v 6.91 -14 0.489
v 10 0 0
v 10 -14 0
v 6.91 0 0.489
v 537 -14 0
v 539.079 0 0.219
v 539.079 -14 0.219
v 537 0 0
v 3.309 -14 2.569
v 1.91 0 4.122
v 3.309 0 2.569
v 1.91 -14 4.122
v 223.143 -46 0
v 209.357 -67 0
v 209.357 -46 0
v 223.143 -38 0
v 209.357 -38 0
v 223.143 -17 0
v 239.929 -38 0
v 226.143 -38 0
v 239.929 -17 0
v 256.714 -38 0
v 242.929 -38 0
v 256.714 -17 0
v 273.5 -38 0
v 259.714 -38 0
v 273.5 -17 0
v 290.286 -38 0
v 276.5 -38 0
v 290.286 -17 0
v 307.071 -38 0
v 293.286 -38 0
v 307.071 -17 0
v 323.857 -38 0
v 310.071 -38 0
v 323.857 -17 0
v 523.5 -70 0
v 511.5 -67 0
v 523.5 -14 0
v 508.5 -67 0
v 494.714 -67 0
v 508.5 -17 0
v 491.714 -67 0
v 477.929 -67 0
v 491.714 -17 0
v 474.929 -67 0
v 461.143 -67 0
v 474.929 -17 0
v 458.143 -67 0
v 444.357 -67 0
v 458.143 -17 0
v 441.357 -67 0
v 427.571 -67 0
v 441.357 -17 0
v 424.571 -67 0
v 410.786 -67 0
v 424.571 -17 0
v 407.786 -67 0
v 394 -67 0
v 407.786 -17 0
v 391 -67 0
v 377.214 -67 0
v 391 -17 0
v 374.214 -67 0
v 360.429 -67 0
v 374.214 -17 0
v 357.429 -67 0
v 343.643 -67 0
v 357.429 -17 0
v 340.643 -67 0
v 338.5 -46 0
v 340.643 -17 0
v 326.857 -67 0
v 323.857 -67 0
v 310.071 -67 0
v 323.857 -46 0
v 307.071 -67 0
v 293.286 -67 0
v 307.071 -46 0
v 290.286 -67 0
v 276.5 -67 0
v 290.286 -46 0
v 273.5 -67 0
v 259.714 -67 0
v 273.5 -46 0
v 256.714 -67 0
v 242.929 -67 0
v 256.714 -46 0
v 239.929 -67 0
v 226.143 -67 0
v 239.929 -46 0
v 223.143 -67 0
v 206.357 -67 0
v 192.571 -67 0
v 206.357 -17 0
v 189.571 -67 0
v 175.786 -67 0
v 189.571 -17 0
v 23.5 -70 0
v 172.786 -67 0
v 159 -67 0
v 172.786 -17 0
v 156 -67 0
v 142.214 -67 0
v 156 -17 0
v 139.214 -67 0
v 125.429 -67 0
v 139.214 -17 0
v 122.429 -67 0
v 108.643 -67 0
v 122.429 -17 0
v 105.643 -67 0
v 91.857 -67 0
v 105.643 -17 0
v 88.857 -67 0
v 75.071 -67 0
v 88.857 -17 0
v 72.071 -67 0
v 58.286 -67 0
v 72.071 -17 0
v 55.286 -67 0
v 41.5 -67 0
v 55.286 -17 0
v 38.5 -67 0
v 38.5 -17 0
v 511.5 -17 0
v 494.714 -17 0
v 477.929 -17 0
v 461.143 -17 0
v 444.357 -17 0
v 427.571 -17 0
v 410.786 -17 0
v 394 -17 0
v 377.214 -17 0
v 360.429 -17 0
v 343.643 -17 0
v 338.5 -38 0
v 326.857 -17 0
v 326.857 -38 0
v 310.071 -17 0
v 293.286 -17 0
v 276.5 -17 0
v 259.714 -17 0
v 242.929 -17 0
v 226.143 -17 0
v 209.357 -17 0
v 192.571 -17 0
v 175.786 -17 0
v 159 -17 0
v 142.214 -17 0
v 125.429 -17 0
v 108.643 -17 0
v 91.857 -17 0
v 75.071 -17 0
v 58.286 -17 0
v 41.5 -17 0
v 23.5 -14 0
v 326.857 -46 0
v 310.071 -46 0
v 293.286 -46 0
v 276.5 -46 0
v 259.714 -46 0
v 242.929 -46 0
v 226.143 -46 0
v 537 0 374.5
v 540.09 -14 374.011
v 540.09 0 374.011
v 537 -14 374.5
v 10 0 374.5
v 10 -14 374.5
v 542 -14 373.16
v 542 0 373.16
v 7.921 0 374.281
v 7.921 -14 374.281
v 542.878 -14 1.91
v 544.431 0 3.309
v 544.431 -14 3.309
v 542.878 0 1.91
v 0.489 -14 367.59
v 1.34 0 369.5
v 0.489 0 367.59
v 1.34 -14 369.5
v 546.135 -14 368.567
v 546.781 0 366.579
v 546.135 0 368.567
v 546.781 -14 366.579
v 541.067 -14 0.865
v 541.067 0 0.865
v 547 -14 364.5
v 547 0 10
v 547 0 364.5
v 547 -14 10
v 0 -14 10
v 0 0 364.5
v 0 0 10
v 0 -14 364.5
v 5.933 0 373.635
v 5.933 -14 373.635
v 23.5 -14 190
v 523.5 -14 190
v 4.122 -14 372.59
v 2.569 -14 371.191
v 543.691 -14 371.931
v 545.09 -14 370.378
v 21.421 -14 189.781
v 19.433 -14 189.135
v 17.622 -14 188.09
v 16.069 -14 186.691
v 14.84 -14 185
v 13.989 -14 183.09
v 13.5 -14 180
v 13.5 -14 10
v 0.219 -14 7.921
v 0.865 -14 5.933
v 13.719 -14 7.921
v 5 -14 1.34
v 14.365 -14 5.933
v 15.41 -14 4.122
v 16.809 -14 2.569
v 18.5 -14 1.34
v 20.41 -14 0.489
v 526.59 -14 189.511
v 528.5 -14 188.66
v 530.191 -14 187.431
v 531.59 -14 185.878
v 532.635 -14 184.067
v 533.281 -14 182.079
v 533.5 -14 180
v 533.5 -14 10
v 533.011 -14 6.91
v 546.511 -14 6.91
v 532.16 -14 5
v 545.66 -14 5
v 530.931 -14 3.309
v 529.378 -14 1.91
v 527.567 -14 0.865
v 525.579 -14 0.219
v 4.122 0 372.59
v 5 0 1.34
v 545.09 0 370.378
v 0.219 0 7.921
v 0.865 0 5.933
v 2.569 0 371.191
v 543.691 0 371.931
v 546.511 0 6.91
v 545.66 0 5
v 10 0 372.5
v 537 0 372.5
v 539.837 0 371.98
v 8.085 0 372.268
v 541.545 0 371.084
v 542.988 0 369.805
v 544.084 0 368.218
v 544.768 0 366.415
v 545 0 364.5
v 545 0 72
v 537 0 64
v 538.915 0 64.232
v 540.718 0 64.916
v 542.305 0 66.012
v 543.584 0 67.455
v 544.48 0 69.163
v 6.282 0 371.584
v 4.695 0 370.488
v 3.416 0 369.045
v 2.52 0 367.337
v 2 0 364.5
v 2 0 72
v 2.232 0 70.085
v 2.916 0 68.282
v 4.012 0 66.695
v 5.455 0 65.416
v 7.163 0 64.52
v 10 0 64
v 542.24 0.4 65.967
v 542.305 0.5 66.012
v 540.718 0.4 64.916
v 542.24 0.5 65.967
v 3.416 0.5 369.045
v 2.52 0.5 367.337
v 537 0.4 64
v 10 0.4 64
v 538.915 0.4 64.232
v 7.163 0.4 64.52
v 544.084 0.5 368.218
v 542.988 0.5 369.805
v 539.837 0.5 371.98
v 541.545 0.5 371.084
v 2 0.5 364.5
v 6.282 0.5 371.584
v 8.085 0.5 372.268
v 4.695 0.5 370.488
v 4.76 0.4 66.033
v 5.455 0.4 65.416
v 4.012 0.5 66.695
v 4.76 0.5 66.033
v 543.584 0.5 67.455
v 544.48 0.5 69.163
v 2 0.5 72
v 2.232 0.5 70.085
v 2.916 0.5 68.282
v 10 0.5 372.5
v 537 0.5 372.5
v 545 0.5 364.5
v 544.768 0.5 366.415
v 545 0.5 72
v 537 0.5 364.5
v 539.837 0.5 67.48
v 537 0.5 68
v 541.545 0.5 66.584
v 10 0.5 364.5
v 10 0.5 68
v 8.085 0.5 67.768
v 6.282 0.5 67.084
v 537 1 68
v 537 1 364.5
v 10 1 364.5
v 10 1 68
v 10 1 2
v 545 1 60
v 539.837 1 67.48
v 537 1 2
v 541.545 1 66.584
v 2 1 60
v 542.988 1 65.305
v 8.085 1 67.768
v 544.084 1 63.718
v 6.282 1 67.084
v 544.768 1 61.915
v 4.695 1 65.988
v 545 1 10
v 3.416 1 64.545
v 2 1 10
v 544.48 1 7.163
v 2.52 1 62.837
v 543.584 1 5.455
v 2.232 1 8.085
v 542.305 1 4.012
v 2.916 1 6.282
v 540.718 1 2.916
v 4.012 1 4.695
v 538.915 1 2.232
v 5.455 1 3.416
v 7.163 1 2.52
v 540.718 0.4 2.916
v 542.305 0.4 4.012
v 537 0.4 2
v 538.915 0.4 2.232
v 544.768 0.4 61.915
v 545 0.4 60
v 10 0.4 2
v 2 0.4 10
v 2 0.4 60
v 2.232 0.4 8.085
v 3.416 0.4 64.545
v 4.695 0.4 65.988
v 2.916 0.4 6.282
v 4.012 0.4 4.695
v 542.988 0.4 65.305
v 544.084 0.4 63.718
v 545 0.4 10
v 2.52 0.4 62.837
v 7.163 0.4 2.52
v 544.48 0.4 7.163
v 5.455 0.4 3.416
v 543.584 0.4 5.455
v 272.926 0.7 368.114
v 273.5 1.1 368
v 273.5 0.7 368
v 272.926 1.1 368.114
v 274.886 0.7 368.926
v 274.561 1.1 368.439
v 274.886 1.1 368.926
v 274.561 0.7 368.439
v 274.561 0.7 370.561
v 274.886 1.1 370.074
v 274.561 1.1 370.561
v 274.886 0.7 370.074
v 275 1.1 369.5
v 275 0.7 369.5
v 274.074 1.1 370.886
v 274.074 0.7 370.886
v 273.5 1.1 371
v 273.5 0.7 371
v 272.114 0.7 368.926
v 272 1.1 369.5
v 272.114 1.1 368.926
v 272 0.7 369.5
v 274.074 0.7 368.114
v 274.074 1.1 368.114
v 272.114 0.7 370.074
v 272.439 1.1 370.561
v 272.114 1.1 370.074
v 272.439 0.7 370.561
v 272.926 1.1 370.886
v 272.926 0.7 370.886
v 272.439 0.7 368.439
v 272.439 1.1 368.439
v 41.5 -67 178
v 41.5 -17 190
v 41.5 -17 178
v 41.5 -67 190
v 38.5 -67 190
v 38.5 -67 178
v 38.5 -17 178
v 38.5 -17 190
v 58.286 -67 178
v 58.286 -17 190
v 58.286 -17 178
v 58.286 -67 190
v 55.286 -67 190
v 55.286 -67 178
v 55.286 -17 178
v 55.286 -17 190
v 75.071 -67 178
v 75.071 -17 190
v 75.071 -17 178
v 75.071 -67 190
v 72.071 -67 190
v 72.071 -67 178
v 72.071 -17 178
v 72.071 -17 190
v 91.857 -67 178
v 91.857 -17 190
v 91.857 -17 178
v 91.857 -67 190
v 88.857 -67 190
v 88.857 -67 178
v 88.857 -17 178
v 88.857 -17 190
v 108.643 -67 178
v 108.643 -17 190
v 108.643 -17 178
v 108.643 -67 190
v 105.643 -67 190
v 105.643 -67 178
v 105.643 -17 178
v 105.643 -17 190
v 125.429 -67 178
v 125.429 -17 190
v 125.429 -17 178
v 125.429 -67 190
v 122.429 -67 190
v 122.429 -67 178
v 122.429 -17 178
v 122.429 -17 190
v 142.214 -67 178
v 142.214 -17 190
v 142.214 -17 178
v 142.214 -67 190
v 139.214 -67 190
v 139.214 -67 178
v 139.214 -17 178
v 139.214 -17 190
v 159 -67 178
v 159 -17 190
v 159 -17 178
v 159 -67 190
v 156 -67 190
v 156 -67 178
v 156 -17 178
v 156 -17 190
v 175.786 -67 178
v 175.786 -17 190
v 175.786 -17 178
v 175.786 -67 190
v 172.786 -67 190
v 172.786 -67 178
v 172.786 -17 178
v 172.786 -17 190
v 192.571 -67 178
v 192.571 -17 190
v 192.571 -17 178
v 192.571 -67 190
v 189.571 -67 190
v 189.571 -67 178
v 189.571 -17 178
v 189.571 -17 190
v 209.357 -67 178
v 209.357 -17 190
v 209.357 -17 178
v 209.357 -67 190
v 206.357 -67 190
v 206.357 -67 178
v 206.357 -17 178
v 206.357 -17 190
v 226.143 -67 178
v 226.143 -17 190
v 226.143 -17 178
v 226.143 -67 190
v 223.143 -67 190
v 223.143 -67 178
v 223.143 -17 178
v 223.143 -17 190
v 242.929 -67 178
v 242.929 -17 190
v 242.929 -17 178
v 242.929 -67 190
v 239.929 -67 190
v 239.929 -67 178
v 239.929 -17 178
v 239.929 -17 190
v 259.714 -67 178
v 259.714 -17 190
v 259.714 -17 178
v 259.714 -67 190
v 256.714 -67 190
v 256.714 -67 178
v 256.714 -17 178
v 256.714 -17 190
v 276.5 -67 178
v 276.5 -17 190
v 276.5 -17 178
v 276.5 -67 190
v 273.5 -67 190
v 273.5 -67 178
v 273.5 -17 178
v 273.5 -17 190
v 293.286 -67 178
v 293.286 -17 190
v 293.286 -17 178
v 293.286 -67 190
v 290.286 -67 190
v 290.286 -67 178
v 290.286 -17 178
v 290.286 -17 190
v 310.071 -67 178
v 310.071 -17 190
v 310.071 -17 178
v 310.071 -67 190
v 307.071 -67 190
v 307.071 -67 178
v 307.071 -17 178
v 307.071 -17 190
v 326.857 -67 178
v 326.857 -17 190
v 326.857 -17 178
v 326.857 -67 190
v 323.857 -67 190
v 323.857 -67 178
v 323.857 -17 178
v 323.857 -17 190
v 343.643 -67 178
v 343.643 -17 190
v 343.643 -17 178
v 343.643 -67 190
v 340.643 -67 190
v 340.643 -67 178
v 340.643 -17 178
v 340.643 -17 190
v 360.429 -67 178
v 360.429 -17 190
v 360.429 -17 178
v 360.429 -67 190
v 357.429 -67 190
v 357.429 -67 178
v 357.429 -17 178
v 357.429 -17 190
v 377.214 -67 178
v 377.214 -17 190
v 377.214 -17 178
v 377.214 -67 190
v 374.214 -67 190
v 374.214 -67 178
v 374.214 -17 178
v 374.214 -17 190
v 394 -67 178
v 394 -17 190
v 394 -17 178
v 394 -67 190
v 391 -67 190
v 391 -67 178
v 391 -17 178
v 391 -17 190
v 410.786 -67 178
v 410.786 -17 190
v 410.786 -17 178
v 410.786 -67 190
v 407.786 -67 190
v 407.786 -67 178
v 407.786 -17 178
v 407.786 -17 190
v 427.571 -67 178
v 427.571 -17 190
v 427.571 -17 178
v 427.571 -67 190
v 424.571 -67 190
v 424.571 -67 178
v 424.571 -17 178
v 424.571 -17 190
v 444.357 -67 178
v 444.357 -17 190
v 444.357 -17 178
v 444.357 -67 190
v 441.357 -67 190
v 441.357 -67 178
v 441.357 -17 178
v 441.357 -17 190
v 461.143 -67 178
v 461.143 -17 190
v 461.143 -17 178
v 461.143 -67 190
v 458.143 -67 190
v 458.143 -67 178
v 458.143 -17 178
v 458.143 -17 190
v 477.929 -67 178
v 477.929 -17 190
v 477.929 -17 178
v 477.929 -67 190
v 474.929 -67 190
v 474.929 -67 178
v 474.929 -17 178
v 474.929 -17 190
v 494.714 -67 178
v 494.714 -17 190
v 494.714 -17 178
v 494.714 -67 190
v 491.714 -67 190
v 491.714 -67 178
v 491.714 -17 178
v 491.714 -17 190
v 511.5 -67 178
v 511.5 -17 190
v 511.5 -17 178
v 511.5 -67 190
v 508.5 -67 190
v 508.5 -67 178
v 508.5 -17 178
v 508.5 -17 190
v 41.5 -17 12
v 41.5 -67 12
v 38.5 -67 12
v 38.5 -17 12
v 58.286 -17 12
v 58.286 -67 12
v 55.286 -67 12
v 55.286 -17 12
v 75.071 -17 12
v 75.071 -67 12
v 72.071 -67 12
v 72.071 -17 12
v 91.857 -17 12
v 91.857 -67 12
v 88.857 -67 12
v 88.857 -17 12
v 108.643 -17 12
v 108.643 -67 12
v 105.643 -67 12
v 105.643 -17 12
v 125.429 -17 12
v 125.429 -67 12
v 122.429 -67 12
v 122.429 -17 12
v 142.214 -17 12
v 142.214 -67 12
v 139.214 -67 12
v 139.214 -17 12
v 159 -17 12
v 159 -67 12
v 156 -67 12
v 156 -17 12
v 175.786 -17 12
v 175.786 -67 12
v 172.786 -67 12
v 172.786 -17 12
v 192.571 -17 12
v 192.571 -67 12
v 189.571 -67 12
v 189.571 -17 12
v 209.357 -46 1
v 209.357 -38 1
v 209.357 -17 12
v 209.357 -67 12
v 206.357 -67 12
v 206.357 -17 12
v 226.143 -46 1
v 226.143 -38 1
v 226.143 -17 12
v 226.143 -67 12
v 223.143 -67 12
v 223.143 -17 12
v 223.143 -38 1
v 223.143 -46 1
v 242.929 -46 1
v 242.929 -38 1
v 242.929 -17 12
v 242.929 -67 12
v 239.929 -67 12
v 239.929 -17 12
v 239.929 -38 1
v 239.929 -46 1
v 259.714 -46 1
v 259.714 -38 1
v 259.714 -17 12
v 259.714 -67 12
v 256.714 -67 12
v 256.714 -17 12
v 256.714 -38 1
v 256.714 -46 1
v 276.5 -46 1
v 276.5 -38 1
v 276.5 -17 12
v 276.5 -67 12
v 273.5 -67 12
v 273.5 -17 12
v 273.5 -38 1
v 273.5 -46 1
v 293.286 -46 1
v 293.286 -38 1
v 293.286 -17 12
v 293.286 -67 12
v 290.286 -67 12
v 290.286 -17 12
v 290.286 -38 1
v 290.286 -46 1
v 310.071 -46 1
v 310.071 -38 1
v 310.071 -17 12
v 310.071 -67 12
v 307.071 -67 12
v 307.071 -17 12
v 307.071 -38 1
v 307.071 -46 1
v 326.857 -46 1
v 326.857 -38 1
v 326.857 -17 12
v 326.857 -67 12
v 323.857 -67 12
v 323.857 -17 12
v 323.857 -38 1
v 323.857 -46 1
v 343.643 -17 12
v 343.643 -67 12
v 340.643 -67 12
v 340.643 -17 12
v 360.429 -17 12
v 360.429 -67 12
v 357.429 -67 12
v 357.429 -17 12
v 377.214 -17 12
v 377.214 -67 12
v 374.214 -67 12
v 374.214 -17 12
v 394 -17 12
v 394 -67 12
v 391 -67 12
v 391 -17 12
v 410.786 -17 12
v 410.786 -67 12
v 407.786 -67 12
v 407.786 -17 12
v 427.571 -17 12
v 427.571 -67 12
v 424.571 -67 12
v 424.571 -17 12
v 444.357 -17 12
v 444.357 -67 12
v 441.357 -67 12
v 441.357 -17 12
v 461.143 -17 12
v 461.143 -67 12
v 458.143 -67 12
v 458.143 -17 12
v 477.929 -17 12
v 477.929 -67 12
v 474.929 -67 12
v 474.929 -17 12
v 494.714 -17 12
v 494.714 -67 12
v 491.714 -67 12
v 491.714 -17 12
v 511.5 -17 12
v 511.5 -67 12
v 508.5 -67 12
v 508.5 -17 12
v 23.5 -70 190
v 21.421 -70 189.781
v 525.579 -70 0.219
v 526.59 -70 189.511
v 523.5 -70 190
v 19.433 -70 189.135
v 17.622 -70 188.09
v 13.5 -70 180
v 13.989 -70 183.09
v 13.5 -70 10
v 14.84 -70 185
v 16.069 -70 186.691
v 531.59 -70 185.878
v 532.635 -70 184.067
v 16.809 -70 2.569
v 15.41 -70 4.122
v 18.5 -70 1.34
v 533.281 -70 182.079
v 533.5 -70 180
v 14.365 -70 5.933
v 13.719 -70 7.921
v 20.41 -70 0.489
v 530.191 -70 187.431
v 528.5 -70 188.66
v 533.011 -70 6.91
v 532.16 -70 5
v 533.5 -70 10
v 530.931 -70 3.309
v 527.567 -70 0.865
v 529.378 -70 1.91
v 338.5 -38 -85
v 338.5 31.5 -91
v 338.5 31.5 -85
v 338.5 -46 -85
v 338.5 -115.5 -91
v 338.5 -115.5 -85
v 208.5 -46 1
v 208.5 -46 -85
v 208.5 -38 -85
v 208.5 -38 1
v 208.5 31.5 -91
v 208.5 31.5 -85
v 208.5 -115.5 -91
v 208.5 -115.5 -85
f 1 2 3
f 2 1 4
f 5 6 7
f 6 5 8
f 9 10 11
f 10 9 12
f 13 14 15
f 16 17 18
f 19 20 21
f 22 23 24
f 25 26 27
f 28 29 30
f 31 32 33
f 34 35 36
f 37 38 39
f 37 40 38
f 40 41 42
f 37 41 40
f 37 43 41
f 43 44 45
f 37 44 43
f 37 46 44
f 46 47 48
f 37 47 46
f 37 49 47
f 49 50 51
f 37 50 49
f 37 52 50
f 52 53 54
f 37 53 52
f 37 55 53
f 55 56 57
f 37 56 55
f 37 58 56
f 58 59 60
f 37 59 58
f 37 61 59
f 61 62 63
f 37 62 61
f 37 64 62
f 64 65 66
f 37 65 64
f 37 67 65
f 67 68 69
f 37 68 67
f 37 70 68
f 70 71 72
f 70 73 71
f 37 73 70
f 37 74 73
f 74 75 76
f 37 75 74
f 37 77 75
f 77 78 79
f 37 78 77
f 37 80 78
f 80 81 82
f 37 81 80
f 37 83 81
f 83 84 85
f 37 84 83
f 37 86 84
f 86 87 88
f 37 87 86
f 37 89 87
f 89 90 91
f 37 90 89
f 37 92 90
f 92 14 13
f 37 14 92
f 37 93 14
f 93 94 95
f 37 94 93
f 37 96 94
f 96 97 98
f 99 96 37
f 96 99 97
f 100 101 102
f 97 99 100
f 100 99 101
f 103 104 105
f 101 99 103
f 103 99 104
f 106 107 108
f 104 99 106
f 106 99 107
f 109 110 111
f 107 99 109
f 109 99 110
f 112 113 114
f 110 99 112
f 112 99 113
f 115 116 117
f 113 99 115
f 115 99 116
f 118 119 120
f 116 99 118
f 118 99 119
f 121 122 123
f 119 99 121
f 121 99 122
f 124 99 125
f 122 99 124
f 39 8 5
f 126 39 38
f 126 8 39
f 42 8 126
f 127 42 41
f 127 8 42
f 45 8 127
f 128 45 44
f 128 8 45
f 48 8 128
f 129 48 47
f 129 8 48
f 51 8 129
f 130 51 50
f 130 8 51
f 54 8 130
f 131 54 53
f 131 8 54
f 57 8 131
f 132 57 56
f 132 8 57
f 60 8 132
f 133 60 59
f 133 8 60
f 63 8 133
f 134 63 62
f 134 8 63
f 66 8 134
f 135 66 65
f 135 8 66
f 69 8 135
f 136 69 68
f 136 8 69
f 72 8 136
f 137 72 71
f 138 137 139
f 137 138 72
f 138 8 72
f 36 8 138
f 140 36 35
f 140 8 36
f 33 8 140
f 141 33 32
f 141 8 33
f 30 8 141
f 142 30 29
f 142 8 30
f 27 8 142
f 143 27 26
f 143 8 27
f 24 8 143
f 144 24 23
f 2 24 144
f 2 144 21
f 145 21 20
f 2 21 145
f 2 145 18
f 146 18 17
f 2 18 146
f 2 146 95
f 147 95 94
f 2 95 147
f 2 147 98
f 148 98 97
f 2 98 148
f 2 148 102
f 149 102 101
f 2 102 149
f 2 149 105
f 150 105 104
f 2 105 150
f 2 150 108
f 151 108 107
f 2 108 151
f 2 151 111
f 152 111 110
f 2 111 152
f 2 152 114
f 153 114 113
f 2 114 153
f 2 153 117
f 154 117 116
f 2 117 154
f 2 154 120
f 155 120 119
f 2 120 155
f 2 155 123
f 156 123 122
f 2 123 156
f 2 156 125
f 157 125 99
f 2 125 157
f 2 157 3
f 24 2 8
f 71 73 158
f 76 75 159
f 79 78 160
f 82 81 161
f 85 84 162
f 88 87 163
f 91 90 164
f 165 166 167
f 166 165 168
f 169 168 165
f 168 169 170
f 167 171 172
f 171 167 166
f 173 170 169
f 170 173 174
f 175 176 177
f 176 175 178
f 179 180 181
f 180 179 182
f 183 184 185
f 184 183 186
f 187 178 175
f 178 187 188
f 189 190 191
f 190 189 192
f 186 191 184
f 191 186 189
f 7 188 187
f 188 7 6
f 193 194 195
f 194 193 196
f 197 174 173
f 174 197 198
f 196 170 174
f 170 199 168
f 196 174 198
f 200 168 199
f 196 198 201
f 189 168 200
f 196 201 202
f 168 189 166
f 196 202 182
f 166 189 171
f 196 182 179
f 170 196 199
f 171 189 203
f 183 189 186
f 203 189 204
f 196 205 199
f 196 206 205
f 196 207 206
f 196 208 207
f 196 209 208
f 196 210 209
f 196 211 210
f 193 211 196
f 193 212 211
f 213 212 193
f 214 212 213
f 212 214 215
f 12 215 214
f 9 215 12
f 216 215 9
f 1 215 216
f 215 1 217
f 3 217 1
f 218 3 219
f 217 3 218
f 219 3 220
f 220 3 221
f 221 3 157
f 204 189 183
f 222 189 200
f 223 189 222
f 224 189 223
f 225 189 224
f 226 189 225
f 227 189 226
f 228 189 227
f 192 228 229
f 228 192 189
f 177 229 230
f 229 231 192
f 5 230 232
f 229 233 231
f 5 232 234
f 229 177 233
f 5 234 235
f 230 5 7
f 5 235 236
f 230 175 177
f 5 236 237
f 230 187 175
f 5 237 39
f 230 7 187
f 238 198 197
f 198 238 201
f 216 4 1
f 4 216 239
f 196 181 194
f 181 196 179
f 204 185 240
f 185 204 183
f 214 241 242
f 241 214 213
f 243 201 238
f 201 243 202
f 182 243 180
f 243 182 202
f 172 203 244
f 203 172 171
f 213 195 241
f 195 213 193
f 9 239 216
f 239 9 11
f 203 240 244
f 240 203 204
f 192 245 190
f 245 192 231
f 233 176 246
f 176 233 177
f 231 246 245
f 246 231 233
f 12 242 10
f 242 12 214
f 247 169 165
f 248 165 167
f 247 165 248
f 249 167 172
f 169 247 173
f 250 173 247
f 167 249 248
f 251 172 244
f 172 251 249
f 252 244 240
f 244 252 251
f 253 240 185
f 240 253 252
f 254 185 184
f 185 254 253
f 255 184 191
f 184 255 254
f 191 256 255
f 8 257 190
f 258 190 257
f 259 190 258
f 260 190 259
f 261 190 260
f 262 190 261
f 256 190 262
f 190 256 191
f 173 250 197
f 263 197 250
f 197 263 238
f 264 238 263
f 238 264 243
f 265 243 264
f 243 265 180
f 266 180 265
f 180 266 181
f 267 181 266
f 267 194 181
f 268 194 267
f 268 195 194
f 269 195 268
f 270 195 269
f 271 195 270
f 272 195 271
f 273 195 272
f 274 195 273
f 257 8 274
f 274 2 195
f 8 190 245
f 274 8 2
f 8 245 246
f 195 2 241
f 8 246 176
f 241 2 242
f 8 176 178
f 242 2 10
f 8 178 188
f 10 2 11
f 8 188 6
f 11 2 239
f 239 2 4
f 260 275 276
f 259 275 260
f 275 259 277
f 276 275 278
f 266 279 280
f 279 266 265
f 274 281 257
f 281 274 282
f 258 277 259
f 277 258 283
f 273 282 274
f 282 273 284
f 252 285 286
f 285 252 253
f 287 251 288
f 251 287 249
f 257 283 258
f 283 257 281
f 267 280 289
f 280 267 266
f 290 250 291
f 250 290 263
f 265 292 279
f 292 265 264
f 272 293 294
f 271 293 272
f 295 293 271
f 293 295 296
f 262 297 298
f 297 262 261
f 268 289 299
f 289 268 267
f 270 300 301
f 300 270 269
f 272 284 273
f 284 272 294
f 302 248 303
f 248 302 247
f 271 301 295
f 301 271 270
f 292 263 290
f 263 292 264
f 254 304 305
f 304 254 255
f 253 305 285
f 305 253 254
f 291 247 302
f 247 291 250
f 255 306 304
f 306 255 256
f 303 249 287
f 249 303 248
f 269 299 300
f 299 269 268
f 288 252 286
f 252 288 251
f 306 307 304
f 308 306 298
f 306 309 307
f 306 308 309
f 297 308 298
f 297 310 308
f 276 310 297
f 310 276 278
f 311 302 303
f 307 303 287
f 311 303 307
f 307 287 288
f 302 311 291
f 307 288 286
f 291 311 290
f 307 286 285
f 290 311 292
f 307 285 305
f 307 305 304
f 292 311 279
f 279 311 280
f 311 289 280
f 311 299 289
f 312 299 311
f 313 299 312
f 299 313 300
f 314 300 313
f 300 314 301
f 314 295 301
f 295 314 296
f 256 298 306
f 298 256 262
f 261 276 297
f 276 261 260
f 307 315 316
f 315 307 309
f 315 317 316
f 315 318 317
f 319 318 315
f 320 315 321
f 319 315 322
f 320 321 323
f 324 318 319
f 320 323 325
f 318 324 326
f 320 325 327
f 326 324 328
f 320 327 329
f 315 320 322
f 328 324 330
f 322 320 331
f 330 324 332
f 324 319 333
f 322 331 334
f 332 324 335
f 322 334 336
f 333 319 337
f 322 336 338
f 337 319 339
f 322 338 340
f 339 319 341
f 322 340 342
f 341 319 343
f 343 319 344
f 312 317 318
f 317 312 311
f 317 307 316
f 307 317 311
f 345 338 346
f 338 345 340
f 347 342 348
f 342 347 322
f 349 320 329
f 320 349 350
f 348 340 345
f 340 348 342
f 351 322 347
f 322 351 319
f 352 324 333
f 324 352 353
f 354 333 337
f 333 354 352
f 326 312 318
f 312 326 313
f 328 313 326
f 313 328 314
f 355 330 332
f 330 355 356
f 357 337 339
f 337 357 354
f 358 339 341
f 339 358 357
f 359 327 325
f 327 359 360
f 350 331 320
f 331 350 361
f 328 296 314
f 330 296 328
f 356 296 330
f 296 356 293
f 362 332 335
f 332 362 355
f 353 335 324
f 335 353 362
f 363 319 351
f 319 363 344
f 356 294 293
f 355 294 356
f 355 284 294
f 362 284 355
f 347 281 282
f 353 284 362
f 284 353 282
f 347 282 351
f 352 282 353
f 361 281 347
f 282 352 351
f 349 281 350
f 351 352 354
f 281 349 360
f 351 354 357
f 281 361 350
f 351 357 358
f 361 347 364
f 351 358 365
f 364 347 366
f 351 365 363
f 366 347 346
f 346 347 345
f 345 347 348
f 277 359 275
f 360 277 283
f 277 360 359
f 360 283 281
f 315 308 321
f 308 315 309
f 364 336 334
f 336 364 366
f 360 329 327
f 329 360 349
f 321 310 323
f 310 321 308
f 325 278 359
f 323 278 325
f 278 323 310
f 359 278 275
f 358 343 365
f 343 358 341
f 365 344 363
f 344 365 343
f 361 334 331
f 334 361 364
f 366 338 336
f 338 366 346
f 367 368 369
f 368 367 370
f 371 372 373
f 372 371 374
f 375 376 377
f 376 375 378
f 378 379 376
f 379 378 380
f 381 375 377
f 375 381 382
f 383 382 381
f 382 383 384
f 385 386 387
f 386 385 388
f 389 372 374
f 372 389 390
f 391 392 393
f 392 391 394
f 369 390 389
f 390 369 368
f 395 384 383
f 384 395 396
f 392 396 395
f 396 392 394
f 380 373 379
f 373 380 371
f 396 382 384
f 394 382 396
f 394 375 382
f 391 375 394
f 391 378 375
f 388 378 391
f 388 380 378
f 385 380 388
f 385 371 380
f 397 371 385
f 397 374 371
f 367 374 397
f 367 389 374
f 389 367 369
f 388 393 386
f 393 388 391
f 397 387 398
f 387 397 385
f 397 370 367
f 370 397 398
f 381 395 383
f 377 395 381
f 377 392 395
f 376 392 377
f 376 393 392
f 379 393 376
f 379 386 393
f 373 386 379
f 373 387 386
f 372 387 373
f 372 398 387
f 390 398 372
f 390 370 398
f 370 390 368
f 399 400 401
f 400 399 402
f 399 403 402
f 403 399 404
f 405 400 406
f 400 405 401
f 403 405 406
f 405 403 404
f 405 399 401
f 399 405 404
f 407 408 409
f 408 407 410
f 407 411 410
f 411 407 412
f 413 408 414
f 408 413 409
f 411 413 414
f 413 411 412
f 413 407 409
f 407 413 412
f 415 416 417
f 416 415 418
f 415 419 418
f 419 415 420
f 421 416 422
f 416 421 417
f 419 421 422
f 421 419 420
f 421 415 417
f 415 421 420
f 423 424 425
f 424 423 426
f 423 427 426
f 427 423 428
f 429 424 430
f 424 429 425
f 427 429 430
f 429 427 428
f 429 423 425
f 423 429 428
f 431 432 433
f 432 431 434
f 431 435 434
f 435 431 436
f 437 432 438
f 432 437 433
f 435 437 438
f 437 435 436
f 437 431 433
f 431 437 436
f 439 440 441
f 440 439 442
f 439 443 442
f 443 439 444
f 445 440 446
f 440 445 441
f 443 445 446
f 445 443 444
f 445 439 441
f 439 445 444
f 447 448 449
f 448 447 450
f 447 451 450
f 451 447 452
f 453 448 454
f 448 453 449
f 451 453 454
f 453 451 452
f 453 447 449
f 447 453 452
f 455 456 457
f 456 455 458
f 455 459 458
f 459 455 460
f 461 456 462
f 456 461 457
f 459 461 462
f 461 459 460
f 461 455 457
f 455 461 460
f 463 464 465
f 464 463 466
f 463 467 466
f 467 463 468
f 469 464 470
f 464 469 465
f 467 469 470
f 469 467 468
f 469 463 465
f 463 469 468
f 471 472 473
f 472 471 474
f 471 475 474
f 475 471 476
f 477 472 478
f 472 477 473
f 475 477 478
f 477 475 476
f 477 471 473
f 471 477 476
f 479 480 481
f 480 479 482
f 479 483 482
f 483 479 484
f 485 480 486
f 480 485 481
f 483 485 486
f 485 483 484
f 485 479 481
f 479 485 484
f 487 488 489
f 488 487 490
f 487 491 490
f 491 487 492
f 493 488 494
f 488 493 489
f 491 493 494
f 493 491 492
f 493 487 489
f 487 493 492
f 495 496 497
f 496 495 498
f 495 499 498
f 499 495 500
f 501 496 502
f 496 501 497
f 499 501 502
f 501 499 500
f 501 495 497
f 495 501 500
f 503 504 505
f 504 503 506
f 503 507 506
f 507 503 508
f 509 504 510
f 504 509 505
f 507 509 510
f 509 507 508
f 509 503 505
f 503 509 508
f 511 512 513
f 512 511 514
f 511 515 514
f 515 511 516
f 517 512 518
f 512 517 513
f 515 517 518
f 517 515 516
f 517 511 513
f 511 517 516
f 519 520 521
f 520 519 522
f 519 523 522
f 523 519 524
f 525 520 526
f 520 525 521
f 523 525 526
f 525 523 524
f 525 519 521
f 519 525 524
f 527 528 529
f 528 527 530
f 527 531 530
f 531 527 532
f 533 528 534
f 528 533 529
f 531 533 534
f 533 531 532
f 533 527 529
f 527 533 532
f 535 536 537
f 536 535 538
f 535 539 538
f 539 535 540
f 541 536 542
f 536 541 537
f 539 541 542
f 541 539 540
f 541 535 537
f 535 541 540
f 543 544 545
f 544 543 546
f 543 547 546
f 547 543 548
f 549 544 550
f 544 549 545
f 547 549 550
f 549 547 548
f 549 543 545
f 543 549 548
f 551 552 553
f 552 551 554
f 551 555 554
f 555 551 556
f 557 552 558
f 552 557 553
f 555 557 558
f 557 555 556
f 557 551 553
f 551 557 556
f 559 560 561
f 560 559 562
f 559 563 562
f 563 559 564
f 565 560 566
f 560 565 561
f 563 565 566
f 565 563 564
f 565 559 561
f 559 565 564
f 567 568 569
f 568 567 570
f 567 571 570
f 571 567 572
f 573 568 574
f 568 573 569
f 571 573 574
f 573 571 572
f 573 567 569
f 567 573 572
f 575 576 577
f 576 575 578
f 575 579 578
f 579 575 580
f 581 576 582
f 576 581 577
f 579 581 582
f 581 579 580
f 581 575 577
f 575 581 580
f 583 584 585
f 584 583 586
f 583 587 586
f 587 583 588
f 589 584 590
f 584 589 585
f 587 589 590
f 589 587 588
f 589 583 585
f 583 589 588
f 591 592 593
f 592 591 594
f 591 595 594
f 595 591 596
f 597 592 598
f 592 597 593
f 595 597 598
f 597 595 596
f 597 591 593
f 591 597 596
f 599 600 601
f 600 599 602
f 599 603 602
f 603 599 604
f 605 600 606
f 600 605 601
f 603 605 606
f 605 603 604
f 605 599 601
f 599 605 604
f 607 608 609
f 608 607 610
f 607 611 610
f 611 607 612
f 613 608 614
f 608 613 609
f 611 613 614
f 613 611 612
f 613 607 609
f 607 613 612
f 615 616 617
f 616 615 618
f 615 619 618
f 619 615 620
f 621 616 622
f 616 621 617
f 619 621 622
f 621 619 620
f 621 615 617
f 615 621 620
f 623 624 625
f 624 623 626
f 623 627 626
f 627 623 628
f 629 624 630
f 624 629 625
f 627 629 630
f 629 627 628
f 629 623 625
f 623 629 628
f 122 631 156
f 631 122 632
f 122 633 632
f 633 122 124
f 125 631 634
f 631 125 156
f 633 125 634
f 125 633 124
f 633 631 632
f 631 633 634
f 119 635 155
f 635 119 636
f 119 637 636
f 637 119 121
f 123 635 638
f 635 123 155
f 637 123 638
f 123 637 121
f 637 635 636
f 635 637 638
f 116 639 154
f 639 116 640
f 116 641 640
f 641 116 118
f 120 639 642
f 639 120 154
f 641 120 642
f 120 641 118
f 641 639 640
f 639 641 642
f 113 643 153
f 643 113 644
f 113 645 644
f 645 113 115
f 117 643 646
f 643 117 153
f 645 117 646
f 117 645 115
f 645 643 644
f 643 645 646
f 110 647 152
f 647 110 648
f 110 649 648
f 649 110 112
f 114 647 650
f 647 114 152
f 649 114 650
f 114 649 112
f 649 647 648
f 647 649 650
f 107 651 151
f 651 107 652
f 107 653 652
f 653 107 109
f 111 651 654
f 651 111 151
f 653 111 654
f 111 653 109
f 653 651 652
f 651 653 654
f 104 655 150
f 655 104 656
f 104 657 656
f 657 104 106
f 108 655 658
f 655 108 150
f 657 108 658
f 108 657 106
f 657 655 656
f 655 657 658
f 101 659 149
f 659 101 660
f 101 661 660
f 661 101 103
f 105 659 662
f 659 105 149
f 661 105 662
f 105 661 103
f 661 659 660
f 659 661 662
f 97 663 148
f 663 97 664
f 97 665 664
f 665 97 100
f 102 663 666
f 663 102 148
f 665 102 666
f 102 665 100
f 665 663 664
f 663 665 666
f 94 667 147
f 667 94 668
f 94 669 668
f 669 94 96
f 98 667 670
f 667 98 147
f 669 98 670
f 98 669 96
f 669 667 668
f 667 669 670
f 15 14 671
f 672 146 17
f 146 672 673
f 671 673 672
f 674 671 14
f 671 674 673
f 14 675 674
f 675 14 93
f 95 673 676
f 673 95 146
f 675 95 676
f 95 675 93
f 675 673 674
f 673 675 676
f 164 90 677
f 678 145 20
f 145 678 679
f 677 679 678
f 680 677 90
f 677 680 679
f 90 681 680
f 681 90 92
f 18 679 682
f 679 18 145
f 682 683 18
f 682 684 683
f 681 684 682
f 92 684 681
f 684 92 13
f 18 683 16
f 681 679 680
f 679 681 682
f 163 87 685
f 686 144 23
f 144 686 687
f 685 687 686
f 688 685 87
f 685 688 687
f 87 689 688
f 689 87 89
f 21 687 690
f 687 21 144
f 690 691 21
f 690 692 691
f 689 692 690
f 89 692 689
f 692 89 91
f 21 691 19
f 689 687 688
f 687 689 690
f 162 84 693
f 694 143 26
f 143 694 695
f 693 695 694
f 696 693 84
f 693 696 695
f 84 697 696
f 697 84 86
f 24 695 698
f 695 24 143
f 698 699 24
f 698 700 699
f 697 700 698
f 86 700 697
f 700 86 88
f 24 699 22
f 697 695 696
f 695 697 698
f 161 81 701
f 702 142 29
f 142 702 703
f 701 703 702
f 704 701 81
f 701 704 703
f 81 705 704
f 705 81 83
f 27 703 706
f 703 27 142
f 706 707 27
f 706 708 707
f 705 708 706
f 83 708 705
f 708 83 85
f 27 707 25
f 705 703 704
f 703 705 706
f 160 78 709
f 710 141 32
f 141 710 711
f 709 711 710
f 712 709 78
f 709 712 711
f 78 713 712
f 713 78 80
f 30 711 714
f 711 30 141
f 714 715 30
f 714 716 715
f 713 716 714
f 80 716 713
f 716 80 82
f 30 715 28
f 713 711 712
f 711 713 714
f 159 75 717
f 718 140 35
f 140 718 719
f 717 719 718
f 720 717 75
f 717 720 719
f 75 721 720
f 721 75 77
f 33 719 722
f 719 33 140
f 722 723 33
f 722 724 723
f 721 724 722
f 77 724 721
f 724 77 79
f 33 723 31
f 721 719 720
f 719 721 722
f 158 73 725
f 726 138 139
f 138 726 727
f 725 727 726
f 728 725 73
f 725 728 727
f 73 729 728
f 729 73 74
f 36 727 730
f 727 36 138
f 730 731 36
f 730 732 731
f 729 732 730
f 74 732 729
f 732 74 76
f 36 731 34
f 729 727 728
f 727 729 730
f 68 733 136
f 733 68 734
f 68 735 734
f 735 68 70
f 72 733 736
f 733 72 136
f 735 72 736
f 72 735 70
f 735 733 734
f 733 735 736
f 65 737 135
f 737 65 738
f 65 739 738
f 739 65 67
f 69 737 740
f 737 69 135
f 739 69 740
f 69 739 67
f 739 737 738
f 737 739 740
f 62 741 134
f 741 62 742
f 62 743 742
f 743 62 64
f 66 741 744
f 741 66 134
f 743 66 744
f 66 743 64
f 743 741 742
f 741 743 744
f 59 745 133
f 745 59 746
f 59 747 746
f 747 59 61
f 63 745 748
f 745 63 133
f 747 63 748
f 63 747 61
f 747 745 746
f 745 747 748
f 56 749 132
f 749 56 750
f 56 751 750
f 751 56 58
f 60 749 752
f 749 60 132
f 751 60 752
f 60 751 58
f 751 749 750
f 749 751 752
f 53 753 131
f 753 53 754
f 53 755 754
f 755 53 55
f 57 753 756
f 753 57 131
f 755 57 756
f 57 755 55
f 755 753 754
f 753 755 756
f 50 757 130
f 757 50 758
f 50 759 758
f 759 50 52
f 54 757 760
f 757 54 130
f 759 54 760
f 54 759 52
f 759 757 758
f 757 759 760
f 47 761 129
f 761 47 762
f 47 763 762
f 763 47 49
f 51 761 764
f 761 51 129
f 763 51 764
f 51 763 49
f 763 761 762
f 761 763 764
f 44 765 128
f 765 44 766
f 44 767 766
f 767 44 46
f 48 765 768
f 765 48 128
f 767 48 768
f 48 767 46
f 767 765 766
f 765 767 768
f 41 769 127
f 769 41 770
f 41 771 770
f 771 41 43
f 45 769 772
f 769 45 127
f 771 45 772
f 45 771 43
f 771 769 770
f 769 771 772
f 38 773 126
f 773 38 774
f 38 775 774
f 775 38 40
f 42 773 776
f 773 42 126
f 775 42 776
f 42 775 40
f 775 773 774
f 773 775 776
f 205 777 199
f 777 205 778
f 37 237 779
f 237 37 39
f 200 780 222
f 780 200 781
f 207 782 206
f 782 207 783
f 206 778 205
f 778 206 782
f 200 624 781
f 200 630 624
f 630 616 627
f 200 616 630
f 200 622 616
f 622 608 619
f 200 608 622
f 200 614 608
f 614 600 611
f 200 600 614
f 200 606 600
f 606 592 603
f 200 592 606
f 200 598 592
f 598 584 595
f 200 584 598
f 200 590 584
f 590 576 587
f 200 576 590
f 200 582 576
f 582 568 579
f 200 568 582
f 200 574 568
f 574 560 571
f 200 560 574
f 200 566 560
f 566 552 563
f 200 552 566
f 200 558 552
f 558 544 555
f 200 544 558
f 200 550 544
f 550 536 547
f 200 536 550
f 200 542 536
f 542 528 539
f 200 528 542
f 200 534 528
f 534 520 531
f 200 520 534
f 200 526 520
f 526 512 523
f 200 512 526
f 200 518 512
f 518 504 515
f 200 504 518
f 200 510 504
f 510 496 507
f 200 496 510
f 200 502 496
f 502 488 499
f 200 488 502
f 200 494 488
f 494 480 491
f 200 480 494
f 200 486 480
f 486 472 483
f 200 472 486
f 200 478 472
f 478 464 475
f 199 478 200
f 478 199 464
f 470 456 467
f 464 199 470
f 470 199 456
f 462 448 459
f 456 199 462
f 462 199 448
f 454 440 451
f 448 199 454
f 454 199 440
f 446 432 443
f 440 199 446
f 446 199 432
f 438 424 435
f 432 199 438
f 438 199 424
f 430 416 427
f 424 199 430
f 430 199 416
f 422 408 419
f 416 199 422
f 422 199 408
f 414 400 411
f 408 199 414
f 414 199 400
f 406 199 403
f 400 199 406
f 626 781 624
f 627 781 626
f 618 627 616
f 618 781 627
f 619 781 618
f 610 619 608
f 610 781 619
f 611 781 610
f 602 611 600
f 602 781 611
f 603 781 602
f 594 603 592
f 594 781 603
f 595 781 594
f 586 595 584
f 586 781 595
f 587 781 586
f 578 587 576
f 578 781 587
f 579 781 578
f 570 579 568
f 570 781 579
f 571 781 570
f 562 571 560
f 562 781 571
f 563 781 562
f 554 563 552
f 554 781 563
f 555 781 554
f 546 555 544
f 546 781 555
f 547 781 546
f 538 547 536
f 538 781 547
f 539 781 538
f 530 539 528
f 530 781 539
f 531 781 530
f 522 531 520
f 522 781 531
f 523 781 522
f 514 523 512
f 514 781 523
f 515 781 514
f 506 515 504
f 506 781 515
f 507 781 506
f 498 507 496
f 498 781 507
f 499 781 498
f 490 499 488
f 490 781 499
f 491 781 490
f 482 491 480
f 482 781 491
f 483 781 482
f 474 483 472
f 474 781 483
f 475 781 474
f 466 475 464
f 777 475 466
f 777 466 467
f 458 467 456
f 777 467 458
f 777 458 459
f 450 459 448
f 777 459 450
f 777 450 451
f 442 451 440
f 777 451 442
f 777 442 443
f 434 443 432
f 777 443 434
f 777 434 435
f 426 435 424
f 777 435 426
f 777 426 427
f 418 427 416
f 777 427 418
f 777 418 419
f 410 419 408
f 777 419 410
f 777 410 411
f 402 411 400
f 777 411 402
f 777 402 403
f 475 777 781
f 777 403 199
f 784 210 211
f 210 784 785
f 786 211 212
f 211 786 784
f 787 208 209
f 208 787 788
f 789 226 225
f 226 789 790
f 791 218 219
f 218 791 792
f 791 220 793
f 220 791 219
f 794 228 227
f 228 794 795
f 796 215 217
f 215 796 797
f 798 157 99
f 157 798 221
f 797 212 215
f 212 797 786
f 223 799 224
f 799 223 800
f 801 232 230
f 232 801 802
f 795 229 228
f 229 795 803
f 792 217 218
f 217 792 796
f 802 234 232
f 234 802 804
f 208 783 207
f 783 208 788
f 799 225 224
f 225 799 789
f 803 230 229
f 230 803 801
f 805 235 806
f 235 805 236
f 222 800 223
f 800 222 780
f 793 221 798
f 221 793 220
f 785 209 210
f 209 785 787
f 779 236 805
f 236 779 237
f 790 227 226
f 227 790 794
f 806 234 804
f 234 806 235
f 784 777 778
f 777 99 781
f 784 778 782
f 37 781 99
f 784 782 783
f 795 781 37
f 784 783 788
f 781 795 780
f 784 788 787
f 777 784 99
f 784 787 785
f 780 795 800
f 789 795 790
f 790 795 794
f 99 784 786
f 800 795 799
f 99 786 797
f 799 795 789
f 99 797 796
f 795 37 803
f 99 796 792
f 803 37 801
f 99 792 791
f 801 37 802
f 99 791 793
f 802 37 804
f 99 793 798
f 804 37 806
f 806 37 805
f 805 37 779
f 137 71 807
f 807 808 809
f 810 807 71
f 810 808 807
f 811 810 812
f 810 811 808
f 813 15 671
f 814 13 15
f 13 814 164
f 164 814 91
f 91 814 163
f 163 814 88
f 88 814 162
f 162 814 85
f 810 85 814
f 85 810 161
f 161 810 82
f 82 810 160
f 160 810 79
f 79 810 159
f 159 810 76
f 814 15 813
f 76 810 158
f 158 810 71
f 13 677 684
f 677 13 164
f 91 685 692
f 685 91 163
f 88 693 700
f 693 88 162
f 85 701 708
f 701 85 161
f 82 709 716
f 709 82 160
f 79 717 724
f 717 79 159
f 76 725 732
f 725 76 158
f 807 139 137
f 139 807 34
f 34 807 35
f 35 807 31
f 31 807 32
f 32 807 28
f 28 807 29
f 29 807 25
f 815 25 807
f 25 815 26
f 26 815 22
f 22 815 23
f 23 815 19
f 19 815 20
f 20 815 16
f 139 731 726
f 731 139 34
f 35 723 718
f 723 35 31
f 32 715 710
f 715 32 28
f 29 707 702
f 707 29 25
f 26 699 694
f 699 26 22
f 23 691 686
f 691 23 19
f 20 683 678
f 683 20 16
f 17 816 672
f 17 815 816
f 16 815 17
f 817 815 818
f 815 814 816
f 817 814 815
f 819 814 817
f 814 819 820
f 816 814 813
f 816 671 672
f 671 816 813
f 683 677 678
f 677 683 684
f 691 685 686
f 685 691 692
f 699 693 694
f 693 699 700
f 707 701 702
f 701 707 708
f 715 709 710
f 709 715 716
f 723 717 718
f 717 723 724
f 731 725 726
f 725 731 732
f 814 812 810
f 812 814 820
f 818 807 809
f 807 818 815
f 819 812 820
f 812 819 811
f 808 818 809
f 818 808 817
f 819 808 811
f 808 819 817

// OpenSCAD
// iMac(24インチ, M6, 2026) 風 一体型ゲーミングPC (v3)   単位: mm
// 寸法の根拠: Apple公式スペック(幅54.7cm/高さ46.1cm/スタンド奥行14.7cm/幅13cm)と公式画像の比率
// 座標: x=幅, y=高さ(本体下端=0), z=奥行(前面ガラス=0, 背面方向+)
// cutaway=true で背面カバーを外し内部配置を表示
cutaway = false;
flip = false;   // true: モデルを180°回して前面を明るく描画(プレビューの光源が固定のため)
color_scheme = "silver";   // silver / blue / purple / pink / orange / yellow / green (公式7色)

// --- 外形 (iMac 24") ---
W = 547;                    // 本体幅 (公式 54.7cm)
panel_w = 527; panel_h = 296.5;   // 23.8" 16:9 パネル有効領域 (iMacの表示領域は約520x292)
bezel = 10;  chin = 68;
H = panel_h + bezel + chin;       // ≈374.5
slab_t = 14;                // 前面スラブ厚 (iMacは11.5mm, 市販パネル+背面板で14mm)
corner = 10;
// --- 背面ポッド(市販部品を収める) ---
pod_w = 520; pod_h = 190; pod_t = 70;     // 総厚70mm
pod_x0 = (W-pod_w)/2;
// --- スタンド(iMac風一枚板アルミ) ---
stand_w = 130; stand_drop = 85;           // 公式: 本体下端から約85mm下がる(高さ46.1cm)
foot_d = 147;
cx = pod_x0;

// 色はApple公式画像(iMac 24" M6 ページ)から実測した値: [名前, 背面, スタンド, チン]
palette = [
 ["silver", "#D2D3D5", "#BBBCBE", "#D7D8DA"],
 ["blue",   "#5882B2", "#9EB2CD", "#BACEE9"],
 ["purple", "#8581B4", "#ACA3C0", "#C9C5E6"],
 ["pink",   "#E16280", "#E7A9B6", "#FFCFDB"],
 ["orange", "#E5734E", "#F0B498", "#FFCCAF"],
 ["yellow", "#EFD344", "#DCCB97", "#FDEEB7"],
 ["green",  "#41965F", "#A2BFAD", "#B9D8C6"] ];
pal = palette[search([color_scheme],palette)[0]];
body_c = pal[1]; stand_c = pal[2]; chin_c = pal[3];

module rrect(w,h,t,r){ linear_extrude(t) offset(r) offset(-r) square([w,h]); }
module box(p,s,c){ color(c) translate(p) cube(s); }

module slab(){
  color(body_c) rrect(W,H,slab_t,corner);
  color("#EDEEF0") translate([2,H-bezel-panel_h-4,-0.5]) rrect(W-4,panel_h+bezel+4-2,0.6,corner-2); // 前面ガラス(白縁)
  color("#0a0a0c") translate([(W-panel_w)/2,chin,-1]) cube([panel_w,panel_h,0.6]);                     // 表示領域
  color(chin_c)  translate([2,2,-1]) rrect(W-4,chin-2,0.6,corner-2);                                   // チン(淡色)
  color("#333") translate([W/2,H-5,-1.1]) cylinder(d=3,h=0.4,$fn=16);                                  // カメラ
}

module pod_cover(){
  difference(){
    color(body_c) translate([pod_x0,0,slab_t]) rrect(pod_w,pod_h,pod_t-slab_t,10);
    for(i=[0:28]) translate([pod_x0+25+i*(pod_w-50)/28, pod_h-12, slab_t+3]) cube([3,14,pod_t-slab_t-6]);  // 排気
    for(i=[0:28]) translate([pod_x0+25+i*(pod_w-50)/28, -2, slab_t+3]) cube([3,14,pod_t-slab_t-6]);        // 吸気
    if(cutaway) translate([pod_x0+3,3,slab_t+2.5]) cube([pod_w-6,pod_h-6,pod_t]);
  }
  // 背面I/O: iMac風の細スロットを左下に4つ
  if(!cutaway) for(i=[0:3]) color("#222") translate([pod_x0+30+i*14,18,pod_t-0.3]) rrect(4,12,0.4,2);
}

z0 = slab_t + 3;
module internals(){
  x = pod_x0;
  box([x+8,8,z0],[170,170,1.6],"#2a6a3a");                           // Mini-ITX 170x170
  box([x+60,60,z0+1.6],[66,66,35],"#b0b3b8");                         // 低背CPUクーラー
  color("#222") translate([x+93,93,z0+36.6]) cylinder(d=92,h=2,$fn=48);
  box([x+16,18,z0+1.6],[22,10,4],"#333");                             // M.2 SSD
  box([x+178,30,z0],[8,100,12],"#554");                               // PCIe ライザー
  box([x+188,20,z0],[200,125,40],"#202226");                          // GPU (ITX 2スロット)
  color("#888") translate([x+288,82,z0+40.1]) cylinder(d=70,h=0.5,$fn=40);
  box([x+188,148,z0],[150,34,22],"#334");                             // DC-ATX 電源基板
  box([x+396,35,z0],[120,120,25],"#111");                             // 排気ファン 120mm
  color("#555") translate([x+456,95,z0+25.1]) cylinder(d=100,h=0.5,$fn=48);
}

module stand(){
  color(stand_c) translate([W/2-stand_w/2,-stand_drop,(slab_t+pod_t)/2-4]) cube([stand_w,stand_drop+1,8]);        // アーム
  color(stand_c) translate([W/2-stand_w/2,-stand_drop-6,(slab_t+pod_t)/2-foot_d/2]) cube([stand_w,6,foot_d]);     // 足
}

translate([flip?W:0,0,0]) rotate([0,0,flip?180:0]) rotate([90,0,0]) { slab(); pod_cover(); stand(); if(cutaway) internals(); }
